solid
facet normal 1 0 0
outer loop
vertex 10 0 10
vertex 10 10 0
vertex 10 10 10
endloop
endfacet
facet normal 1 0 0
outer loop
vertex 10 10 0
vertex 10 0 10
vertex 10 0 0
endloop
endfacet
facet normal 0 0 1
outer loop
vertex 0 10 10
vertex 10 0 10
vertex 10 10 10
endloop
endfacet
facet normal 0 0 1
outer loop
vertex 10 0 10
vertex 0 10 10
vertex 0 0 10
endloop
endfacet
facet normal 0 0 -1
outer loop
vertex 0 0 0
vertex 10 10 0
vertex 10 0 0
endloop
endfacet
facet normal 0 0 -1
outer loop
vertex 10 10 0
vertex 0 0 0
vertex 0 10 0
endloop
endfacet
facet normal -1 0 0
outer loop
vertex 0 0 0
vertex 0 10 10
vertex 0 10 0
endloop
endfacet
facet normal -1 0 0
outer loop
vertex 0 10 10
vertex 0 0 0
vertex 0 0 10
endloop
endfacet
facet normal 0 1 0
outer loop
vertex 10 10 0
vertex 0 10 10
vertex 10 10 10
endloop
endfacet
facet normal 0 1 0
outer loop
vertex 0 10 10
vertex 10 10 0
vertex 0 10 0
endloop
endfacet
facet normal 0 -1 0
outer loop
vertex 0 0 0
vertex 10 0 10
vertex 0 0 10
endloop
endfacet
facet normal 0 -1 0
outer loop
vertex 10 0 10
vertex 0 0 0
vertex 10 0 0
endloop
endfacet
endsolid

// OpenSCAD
difference()
{
	cube ([10,10,10]);
	rotate([0,0,35])
		%cube([20,20,10]);
}
